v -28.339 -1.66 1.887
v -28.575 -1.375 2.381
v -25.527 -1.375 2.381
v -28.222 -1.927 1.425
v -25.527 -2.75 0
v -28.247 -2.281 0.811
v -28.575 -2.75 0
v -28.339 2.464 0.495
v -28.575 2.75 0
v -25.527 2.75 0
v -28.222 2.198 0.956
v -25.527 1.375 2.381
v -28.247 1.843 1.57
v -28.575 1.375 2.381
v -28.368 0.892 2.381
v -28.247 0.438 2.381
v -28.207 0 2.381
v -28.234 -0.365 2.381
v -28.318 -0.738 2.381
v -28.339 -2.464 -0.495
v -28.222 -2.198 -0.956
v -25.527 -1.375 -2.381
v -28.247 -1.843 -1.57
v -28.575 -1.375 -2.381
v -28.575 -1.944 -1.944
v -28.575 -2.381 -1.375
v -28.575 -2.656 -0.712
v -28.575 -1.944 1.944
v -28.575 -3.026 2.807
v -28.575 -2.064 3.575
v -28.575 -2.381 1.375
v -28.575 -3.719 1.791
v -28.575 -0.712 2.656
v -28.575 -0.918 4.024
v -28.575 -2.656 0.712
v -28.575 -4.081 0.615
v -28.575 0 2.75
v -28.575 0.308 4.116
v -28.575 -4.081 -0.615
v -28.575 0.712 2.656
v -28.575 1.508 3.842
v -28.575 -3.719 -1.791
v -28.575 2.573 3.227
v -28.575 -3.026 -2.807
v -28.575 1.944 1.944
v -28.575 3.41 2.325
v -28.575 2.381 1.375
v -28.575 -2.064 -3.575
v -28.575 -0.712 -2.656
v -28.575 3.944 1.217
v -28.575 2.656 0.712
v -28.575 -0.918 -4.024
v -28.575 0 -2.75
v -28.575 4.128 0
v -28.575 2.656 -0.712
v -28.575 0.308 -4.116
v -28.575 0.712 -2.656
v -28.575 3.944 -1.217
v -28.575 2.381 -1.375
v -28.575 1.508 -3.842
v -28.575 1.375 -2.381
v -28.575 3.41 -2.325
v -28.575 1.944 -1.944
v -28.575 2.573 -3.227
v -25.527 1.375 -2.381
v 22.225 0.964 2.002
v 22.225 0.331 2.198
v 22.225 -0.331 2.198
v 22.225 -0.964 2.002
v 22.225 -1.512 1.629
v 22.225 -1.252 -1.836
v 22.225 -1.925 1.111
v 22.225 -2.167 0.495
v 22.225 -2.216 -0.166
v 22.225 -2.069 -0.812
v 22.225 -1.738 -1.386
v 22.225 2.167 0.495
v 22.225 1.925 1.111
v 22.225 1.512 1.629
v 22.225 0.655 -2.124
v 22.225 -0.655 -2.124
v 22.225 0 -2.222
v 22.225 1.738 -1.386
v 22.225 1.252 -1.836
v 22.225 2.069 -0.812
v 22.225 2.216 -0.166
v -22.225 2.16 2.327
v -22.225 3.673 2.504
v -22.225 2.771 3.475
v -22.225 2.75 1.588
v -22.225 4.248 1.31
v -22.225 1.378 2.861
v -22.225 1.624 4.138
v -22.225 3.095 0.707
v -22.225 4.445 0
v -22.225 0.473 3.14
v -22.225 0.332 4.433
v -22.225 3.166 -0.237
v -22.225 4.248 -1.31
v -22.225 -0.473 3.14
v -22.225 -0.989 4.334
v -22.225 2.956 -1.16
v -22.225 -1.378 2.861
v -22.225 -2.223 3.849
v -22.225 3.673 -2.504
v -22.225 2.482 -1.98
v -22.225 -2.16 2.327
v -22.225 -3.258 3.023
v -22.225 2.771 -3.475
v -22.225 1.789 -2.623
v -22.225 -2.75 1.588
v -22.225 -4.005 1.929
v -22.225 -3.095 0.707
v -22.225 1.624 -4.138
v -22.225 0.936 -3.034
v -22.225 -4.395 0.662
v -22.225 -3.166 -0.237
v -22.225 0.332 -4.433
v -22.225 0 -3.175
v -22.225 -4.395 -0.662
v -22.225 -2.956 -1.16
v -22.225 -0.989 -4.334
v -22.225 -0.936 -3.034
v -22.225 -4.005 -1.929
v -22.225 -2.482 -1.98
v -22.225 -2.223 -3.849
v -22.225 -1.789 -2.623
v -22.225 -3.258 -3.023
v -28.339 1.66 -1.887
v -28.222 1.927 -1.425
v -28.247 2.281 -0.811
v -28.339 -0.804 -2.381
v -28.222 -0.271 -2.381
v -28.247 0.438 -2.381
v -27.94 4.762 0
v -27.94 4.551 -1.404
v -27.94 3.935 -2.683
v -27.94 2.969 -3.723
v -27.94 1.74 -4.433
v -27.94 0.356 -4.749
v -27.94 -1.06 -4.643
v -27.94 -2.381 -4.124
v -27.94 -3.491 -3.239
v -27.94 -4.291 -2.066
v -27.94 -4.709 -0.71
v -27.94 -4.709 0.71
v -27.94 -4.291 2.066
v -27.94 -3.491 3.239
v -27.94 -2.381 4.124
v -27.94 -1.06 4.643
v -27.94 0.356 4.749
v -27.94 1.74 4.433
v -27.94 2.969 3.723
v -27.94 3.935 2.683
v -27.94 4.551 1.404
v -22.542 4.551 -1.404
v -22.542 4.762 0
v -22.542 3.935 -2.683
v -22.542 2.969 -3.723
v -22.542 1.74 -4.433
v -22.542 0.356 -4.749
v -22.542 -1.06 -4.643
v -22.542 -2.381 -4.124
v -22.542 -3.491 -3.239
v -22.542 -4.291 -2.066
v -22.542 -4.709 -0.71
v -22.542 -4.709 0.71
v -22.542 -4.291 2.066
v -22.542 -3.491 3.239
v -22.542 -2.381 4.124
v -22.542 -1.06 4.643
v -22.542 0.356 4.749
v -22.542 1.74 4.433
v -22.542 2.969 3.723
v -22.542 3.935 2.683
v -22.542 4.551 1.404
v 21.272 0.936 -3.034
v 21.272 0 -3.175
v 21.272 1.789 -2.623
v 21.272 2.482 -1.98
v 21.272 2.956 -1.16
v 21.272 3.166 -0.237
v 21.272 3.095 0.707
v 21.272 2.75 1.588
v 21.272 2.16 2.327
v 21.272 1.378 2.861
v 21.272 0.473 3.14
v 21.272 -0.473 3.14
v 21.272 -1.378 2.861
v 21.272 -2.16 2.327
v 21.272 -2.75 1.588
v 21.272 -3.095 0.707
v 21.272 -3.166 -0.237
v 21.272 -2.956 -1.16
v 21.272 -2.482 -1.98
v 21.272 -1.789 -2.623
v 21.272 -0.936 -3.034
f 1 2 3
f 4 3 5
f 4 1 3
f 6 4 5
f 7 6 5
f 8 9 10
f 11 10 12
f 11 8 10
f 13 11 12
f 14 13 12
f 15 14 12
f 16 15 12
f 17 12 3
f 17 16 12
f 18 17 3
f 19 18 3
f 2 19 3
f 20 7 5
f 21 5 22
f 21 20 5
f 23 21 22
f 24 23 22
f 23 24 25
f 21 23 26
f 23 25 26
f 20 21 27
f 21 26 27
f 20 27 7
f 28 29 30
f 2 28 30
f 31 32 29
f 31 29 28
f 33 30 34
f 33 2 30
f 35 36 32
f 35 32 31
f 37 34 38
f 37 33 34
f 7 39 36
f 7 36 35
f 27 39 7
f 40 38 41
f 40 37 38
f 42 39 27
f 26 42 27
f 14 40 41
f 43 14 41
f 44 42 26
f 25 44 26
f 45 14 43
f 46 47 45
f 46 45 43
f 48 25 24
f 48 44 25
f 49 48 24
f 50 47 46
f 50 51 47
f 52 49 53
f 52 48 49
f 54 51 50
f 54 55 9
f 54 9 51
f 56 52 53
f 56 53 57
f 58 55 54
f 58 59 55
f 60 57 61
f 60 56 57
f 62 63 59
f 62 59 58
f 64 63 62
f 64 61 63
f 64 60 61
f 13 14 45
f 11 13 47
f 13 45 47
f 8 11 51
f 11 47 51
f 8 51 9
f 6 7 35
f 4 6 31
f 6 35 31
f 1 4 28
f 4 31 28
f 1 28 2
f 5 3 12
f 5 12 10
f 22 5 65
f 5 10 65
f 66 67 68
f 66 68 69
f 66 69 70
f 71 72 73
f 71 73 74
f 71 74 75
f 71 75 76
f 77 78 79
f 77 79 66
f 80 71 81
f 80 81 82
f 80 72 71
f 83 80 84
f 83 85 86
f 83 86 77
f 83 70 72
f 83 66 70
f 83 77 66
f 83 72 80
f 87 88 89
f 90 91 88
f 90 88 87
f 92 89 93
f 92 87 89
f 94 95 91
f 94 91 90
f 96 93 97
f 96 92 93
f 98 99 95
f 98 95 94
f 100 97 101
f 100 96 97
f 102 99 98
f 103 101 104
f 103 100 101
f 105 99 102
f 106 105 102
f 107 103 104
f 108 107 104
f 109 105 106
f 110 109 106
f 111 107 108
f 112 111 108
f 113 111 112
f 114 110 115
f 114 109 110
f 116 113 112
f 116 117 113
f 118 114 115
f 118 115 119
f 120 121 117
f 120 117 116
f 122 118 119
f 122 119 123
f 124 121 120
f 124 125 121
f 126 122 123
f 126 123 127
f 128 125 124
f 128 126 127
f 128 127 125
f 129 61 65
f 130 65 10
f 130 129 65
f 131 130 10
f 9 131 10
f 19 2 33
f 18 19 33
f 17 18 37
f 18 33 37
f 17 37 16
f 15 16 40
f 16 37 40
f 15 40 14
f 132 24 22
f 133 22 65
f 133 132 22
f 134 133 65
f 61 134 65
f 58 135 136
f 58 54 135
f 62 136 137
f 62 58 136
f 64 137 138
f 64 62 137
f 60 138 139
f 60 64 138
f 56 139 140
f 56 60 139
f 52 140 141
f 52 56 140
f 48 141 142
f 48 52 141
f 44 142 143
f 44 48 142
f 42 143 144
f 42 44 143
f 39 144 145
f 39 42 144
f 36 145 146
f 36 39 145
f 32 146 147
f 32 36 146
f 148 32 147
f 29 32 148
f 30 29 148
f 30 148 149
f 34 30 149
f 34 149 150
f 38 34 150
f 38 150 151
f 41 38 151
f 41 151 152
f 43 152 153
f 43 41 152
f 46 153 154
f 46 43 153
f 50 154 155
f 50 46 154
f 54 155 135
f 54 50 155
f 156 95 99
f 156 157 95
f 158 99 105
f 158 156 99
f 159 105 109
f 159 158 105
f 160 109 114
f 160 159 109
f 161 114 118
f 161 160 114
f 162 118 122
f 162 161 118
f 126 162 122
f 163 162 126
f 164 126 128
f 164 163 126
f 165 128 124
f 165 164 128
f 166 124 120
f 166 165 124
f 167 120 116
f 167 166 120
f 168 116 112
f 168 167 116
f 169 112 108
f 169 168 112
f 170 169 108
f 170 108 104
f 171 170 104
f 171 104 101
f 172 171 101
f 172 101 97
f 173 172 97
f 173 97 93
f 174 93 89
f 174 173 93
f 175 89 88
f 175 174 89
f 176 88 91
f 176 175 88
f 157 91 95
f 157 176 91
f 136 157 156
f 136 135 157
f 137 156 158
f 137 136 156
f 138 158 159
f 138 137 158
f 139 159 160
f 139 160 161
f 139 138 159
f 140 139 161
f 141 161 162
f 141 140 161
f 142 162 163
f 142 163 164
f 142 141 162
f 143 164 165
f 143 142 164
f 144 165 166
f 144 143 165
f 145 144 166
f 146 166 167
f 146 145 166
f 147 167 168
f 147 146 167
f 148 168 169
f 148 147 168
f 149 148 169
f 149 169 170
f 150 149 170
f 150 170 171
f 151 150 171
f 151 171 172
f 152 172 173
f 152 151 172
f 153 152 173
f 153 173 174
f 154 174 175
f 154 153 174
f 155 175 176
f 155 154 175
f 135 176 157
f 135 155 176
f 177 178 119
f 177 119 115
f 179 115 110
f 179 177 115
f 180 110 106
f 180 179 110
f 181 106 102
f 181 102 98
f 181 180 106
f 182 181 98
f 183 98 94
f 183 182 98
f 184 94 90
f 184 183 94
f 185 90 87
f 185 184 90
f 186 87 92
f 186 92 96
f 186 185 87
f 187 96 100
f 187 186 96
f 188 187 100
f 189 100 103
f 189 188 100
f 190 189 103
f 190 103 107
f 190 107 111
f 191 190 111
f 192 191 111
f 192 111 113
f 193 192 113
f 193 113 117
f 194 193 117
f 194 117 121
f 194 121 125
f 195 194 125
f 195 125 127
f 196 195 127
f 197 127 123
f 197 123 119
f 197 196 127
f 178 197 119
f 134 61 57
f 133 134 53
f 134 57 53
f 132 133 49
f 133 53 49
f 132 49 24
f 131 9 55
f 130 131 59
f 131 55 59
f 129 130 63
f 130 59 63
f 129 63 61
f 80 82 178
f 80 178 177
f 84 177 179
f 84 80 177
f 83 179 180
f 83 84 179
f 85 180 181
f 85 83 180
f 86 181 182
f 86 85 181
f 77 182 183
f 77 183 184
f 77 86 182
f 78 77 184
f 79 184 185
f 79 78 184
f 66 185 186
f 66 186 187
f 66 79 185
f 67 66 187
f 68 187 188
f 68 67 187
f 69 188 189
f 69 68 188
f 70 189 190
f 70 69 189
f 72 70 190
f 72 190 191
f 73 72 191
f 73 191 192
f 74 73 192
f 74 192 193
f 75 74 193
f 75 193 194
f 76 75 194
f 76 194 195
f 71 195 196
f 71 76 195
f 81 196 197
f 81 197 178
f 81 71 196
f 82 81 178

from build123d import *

# Parameters (mm, degrees)
SKETCH2_R           = 3.175
BOSS_EXTRUDE1_DEPTH = 44.45
CHAMFER1_SIZE       = 0.9525
CUT_EXTRUDE1_DEPTH  = 3.048
SKETCH8_R           = 2.749630657
CUT_EXTRUDE2_DEPTH  = 1.27
CUT_EXTRUDE2_DRAFT  = -45


with BuildPart() as part:
    # Sketch2 → Boss-Extrude1 (new body)
    with BuildSketch(Plane(origin=(22.225, 0, 0), x_dir=(0, 0, -1), z_dir=(1, 0, 0))):
        Circle(SKETCH2_R)
    extrude(amount=-BOSS_EXTRUDE1_DEPTH)

    # Chamfer1
    chamfer1_edges = [part.edges().sort_by_distance(p)[0] for p in [
        (22.225, 0, 3.175),
    ]]
    chamfer(chamfer1_edges, length=CHAMFER1_SIZE)

    # Sketch6 → Revolve1 (revolve)
    with BuildSketch(Plane.XY):
        Polygon((-27.94, 4.7625), (-28.575, 4.1275), (-28.575, 0), (-22.225, 0), (-22.225, 4.445), (-22.5425, 4.7625), align=None)
    revolve(axis=Axis((-22.225, 0, 0), (-1, 0, 0)))

    # Sketch4 → Cut-Extrude1 (cut)
    with BuildSketch(Plane(origin=(-28.575, 0, 0), x_dir=(0, 0, -1), z_dir=(1, 0, 0))):
        Polygon((0, 2.749630657), (-2.38125, 1.374815329), (-2.38125, -1.374815329), (0, -2.749630657), (2.38125, -1.374815329), (2.38125, 1.374815329), align=None)
    extrude(amount=CUT_EXTRUDE1_DEPTH, mode=Mode.SUBTRACT)


with BuildPart() as cut_extrude2_tool:
    # Sketch8 → Cut-Extrude2 (with draft: the straight prism first)
    with BuildSketch(Plane.ZY.offset(28.575)):
        Circle(SKETCH8_R)
    extrude(amount=-CUT_EXTRUDE2_DEPTH)
    # Cut-Extrude2: the draft: its side faces are tilted about the plane it starts from
    cut_extrude2_sides = [cut_extrude2_tool.faces().sort_by_distance(p)[0] for p in [
        (-27.94, 0, -2.749630657),
    ]]
    draft(cut_extrude2_sides, Plane.ZY.offset(28.575), CUT_EXTRUDE2_DRAFT)


with BuildPart() as part_1:
    add(part.part)

    # Cut-Extrude2: cut by cut_extrude2_tool
    add(cut_extrude2_tool.part, mode=Mode.SUBTRACT)


solid = part_1.part
